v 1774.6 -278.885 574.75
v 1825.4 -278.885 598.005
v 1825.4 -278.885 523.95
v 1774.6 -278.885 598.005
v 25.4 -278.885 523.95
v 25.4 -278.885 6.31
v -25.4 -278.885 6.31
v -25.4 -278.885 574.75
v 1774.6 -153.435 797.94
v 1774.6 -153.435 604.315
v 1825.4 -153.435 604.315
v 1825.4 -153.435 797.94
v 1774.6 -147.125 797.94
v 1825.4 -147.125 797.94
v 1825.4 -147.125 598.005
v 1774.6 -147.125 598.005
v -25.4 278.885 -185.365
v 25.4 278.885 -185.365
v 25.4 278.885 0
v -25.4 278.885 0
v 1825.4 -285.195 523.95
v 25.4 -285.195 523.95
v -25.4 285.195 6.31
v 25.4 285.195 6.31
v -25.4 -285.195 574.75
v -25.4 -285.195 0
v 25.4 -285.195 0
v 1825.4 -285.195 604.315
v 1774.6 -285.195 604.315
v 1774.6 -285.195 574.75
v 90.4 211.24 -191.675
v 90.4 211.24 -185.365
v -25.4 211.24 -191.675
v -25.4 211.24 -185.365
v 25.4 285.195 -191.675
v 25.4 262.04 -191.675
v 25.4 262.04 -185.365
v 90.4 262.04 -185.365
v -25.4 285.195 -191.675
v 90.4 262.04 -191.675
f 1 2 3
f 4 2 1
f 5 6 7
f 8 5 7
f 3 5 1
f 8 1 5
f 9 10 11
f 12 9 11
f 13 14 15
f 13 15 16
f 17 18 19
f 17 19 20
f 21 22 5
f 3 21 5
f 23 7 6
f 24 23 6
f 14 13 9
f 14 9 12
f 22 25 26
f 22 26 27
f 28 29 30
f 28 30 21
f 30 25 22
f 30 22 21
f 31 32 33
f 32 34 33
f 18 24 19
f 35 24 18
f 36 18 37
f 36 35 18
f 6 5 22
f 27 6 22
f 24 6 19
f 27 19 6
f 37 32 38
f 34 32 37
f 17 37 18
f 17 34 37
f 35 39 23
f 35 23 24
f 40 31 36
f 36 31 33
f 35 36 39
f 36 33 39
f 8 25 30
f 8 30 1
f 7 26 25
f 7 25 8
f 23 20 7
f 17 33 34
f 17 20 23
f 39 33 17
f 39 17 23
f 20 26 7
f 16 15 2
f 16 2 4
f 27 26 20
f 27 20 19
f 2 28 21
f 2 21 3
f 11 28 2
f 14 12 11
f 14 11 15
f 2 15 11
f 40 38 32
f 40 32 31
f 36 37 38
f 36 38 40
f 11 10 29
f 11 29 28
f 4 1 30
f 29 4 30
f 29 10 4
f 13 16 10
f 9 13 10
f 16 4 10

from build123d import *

# Parameters (mm, degrees)
CROQUIS2_W              = 50.8
CROQUIS2_H              = 570.39
SALIENTE_EXTRUIR1_DEPTH = 6.31
CROQUIS3_W              = 50.8
CROQUIS3_H              = 6.31
SALIENTE_EXTRUIR2_DEPTH = 568.44
CROQUIS4_W              = 50.8
CROQUIS4_H              = 6.31
SALIENTE_EXTRUIR3_DEPTH = 1800
CROQUIS6_W              = 50.8
CROQUIS6_H              = 6.31
CROQUIS9_W              = 50.8
CROQUIS9_H              = 6.31
CROQUIS10_W             = 6.31
CROQUIS10_H             = 50.8
SALIENTE_EXTRUIR4_DEPTH = 65


with BuildPart() as part:
    # Croquis2 → Saliente-Extruir1 (new body)
    with BuildSketch(Plane.XY):
        Rectangle(CROQUIS2_W, CROQUIS2_H)
    extrude(amount=SALIENTE_EXTRUIR1_DEPTH)

    # Croquis3 → Saliente-Extruir2 (add)
    with BuildSketch(Plane.XY.offset(6.31)):
        with Locations((0, -282.04)):
            Rectangle(CROQUIS3_W, CROQUIS3_H)
    extrude(amount=SALIENTE_EXTRUIR2_DEPTH)

    # Croquis4 → Saliente-Extruir3 (add)
    with BuildSketch(Plane(origin=(25.4, 0, 0), x_dir=(0, 0, -1), z_dir=(1, 0, 0))):
        with Locations((-549.35, -282.04)):
            Rectangle(CROQUIS4_W, CROQUIS4_H)
    extrude(amount=SALIENTE_EXTRUIR3_DEPTH)

    # Barrer1: sweep along a curve in space
    with BuildLine() as barrer1_path:
        Line((0, 282.04, 0), (0, 282.04, -188.52))
        Line((0, 282.04, -188.52), (0, 211.24, -188.52))
    # Croquis6 → Barrer1 (sweep)
    with BuildSketch(Plane(origin=(0, 0, 0), x_dir=(-1, 0, 0), z_dir=(0, 0, -1))):
        with Locations((0, 282.04)):
            Rectangle(CROQUIS6_W, CROQUIS6_H)
    sweep(path=barrer1_path.line, transition=Transition.RIGHT)

    # Barrer2: sweep along a curve in space
    with BuildLine() as barrer2_path:
        Line((1800, -282.04, 574.75), (1800, -282.04, 601.16))
        Line((1800, -282.04, 601.16), (1800, -150.28, 601.16))
        Line((1800, -150.28, 601.16), (1800, -150.28, 797.94))
    # Croquis9 → Barrer2 (sweep)
    with BuildSketch(Plane.XY.offset(574.75)):
        with Locations((1800, -282.04)):
            Rectangle(CROQUIS9_W, CROQUIS9_H)
    sweep(path=barrer2_path.line, transition=Transition.RIGHT)

    # Croquis10 → Saliente-Extruir4 (add)
    with BuildSketch(Plane(origin=(25.4, 0, 0), x_dir=(0, 0, -1), z_dir=(1, 0, 0))):
        with Locations((188.52, 236.64)):
            Rectangle(CROQUIS10_W, CROQUIS10_H)
    extrude(amount=SALIENTE_EXTRUIR4_DEPTH)


solid = part.part
